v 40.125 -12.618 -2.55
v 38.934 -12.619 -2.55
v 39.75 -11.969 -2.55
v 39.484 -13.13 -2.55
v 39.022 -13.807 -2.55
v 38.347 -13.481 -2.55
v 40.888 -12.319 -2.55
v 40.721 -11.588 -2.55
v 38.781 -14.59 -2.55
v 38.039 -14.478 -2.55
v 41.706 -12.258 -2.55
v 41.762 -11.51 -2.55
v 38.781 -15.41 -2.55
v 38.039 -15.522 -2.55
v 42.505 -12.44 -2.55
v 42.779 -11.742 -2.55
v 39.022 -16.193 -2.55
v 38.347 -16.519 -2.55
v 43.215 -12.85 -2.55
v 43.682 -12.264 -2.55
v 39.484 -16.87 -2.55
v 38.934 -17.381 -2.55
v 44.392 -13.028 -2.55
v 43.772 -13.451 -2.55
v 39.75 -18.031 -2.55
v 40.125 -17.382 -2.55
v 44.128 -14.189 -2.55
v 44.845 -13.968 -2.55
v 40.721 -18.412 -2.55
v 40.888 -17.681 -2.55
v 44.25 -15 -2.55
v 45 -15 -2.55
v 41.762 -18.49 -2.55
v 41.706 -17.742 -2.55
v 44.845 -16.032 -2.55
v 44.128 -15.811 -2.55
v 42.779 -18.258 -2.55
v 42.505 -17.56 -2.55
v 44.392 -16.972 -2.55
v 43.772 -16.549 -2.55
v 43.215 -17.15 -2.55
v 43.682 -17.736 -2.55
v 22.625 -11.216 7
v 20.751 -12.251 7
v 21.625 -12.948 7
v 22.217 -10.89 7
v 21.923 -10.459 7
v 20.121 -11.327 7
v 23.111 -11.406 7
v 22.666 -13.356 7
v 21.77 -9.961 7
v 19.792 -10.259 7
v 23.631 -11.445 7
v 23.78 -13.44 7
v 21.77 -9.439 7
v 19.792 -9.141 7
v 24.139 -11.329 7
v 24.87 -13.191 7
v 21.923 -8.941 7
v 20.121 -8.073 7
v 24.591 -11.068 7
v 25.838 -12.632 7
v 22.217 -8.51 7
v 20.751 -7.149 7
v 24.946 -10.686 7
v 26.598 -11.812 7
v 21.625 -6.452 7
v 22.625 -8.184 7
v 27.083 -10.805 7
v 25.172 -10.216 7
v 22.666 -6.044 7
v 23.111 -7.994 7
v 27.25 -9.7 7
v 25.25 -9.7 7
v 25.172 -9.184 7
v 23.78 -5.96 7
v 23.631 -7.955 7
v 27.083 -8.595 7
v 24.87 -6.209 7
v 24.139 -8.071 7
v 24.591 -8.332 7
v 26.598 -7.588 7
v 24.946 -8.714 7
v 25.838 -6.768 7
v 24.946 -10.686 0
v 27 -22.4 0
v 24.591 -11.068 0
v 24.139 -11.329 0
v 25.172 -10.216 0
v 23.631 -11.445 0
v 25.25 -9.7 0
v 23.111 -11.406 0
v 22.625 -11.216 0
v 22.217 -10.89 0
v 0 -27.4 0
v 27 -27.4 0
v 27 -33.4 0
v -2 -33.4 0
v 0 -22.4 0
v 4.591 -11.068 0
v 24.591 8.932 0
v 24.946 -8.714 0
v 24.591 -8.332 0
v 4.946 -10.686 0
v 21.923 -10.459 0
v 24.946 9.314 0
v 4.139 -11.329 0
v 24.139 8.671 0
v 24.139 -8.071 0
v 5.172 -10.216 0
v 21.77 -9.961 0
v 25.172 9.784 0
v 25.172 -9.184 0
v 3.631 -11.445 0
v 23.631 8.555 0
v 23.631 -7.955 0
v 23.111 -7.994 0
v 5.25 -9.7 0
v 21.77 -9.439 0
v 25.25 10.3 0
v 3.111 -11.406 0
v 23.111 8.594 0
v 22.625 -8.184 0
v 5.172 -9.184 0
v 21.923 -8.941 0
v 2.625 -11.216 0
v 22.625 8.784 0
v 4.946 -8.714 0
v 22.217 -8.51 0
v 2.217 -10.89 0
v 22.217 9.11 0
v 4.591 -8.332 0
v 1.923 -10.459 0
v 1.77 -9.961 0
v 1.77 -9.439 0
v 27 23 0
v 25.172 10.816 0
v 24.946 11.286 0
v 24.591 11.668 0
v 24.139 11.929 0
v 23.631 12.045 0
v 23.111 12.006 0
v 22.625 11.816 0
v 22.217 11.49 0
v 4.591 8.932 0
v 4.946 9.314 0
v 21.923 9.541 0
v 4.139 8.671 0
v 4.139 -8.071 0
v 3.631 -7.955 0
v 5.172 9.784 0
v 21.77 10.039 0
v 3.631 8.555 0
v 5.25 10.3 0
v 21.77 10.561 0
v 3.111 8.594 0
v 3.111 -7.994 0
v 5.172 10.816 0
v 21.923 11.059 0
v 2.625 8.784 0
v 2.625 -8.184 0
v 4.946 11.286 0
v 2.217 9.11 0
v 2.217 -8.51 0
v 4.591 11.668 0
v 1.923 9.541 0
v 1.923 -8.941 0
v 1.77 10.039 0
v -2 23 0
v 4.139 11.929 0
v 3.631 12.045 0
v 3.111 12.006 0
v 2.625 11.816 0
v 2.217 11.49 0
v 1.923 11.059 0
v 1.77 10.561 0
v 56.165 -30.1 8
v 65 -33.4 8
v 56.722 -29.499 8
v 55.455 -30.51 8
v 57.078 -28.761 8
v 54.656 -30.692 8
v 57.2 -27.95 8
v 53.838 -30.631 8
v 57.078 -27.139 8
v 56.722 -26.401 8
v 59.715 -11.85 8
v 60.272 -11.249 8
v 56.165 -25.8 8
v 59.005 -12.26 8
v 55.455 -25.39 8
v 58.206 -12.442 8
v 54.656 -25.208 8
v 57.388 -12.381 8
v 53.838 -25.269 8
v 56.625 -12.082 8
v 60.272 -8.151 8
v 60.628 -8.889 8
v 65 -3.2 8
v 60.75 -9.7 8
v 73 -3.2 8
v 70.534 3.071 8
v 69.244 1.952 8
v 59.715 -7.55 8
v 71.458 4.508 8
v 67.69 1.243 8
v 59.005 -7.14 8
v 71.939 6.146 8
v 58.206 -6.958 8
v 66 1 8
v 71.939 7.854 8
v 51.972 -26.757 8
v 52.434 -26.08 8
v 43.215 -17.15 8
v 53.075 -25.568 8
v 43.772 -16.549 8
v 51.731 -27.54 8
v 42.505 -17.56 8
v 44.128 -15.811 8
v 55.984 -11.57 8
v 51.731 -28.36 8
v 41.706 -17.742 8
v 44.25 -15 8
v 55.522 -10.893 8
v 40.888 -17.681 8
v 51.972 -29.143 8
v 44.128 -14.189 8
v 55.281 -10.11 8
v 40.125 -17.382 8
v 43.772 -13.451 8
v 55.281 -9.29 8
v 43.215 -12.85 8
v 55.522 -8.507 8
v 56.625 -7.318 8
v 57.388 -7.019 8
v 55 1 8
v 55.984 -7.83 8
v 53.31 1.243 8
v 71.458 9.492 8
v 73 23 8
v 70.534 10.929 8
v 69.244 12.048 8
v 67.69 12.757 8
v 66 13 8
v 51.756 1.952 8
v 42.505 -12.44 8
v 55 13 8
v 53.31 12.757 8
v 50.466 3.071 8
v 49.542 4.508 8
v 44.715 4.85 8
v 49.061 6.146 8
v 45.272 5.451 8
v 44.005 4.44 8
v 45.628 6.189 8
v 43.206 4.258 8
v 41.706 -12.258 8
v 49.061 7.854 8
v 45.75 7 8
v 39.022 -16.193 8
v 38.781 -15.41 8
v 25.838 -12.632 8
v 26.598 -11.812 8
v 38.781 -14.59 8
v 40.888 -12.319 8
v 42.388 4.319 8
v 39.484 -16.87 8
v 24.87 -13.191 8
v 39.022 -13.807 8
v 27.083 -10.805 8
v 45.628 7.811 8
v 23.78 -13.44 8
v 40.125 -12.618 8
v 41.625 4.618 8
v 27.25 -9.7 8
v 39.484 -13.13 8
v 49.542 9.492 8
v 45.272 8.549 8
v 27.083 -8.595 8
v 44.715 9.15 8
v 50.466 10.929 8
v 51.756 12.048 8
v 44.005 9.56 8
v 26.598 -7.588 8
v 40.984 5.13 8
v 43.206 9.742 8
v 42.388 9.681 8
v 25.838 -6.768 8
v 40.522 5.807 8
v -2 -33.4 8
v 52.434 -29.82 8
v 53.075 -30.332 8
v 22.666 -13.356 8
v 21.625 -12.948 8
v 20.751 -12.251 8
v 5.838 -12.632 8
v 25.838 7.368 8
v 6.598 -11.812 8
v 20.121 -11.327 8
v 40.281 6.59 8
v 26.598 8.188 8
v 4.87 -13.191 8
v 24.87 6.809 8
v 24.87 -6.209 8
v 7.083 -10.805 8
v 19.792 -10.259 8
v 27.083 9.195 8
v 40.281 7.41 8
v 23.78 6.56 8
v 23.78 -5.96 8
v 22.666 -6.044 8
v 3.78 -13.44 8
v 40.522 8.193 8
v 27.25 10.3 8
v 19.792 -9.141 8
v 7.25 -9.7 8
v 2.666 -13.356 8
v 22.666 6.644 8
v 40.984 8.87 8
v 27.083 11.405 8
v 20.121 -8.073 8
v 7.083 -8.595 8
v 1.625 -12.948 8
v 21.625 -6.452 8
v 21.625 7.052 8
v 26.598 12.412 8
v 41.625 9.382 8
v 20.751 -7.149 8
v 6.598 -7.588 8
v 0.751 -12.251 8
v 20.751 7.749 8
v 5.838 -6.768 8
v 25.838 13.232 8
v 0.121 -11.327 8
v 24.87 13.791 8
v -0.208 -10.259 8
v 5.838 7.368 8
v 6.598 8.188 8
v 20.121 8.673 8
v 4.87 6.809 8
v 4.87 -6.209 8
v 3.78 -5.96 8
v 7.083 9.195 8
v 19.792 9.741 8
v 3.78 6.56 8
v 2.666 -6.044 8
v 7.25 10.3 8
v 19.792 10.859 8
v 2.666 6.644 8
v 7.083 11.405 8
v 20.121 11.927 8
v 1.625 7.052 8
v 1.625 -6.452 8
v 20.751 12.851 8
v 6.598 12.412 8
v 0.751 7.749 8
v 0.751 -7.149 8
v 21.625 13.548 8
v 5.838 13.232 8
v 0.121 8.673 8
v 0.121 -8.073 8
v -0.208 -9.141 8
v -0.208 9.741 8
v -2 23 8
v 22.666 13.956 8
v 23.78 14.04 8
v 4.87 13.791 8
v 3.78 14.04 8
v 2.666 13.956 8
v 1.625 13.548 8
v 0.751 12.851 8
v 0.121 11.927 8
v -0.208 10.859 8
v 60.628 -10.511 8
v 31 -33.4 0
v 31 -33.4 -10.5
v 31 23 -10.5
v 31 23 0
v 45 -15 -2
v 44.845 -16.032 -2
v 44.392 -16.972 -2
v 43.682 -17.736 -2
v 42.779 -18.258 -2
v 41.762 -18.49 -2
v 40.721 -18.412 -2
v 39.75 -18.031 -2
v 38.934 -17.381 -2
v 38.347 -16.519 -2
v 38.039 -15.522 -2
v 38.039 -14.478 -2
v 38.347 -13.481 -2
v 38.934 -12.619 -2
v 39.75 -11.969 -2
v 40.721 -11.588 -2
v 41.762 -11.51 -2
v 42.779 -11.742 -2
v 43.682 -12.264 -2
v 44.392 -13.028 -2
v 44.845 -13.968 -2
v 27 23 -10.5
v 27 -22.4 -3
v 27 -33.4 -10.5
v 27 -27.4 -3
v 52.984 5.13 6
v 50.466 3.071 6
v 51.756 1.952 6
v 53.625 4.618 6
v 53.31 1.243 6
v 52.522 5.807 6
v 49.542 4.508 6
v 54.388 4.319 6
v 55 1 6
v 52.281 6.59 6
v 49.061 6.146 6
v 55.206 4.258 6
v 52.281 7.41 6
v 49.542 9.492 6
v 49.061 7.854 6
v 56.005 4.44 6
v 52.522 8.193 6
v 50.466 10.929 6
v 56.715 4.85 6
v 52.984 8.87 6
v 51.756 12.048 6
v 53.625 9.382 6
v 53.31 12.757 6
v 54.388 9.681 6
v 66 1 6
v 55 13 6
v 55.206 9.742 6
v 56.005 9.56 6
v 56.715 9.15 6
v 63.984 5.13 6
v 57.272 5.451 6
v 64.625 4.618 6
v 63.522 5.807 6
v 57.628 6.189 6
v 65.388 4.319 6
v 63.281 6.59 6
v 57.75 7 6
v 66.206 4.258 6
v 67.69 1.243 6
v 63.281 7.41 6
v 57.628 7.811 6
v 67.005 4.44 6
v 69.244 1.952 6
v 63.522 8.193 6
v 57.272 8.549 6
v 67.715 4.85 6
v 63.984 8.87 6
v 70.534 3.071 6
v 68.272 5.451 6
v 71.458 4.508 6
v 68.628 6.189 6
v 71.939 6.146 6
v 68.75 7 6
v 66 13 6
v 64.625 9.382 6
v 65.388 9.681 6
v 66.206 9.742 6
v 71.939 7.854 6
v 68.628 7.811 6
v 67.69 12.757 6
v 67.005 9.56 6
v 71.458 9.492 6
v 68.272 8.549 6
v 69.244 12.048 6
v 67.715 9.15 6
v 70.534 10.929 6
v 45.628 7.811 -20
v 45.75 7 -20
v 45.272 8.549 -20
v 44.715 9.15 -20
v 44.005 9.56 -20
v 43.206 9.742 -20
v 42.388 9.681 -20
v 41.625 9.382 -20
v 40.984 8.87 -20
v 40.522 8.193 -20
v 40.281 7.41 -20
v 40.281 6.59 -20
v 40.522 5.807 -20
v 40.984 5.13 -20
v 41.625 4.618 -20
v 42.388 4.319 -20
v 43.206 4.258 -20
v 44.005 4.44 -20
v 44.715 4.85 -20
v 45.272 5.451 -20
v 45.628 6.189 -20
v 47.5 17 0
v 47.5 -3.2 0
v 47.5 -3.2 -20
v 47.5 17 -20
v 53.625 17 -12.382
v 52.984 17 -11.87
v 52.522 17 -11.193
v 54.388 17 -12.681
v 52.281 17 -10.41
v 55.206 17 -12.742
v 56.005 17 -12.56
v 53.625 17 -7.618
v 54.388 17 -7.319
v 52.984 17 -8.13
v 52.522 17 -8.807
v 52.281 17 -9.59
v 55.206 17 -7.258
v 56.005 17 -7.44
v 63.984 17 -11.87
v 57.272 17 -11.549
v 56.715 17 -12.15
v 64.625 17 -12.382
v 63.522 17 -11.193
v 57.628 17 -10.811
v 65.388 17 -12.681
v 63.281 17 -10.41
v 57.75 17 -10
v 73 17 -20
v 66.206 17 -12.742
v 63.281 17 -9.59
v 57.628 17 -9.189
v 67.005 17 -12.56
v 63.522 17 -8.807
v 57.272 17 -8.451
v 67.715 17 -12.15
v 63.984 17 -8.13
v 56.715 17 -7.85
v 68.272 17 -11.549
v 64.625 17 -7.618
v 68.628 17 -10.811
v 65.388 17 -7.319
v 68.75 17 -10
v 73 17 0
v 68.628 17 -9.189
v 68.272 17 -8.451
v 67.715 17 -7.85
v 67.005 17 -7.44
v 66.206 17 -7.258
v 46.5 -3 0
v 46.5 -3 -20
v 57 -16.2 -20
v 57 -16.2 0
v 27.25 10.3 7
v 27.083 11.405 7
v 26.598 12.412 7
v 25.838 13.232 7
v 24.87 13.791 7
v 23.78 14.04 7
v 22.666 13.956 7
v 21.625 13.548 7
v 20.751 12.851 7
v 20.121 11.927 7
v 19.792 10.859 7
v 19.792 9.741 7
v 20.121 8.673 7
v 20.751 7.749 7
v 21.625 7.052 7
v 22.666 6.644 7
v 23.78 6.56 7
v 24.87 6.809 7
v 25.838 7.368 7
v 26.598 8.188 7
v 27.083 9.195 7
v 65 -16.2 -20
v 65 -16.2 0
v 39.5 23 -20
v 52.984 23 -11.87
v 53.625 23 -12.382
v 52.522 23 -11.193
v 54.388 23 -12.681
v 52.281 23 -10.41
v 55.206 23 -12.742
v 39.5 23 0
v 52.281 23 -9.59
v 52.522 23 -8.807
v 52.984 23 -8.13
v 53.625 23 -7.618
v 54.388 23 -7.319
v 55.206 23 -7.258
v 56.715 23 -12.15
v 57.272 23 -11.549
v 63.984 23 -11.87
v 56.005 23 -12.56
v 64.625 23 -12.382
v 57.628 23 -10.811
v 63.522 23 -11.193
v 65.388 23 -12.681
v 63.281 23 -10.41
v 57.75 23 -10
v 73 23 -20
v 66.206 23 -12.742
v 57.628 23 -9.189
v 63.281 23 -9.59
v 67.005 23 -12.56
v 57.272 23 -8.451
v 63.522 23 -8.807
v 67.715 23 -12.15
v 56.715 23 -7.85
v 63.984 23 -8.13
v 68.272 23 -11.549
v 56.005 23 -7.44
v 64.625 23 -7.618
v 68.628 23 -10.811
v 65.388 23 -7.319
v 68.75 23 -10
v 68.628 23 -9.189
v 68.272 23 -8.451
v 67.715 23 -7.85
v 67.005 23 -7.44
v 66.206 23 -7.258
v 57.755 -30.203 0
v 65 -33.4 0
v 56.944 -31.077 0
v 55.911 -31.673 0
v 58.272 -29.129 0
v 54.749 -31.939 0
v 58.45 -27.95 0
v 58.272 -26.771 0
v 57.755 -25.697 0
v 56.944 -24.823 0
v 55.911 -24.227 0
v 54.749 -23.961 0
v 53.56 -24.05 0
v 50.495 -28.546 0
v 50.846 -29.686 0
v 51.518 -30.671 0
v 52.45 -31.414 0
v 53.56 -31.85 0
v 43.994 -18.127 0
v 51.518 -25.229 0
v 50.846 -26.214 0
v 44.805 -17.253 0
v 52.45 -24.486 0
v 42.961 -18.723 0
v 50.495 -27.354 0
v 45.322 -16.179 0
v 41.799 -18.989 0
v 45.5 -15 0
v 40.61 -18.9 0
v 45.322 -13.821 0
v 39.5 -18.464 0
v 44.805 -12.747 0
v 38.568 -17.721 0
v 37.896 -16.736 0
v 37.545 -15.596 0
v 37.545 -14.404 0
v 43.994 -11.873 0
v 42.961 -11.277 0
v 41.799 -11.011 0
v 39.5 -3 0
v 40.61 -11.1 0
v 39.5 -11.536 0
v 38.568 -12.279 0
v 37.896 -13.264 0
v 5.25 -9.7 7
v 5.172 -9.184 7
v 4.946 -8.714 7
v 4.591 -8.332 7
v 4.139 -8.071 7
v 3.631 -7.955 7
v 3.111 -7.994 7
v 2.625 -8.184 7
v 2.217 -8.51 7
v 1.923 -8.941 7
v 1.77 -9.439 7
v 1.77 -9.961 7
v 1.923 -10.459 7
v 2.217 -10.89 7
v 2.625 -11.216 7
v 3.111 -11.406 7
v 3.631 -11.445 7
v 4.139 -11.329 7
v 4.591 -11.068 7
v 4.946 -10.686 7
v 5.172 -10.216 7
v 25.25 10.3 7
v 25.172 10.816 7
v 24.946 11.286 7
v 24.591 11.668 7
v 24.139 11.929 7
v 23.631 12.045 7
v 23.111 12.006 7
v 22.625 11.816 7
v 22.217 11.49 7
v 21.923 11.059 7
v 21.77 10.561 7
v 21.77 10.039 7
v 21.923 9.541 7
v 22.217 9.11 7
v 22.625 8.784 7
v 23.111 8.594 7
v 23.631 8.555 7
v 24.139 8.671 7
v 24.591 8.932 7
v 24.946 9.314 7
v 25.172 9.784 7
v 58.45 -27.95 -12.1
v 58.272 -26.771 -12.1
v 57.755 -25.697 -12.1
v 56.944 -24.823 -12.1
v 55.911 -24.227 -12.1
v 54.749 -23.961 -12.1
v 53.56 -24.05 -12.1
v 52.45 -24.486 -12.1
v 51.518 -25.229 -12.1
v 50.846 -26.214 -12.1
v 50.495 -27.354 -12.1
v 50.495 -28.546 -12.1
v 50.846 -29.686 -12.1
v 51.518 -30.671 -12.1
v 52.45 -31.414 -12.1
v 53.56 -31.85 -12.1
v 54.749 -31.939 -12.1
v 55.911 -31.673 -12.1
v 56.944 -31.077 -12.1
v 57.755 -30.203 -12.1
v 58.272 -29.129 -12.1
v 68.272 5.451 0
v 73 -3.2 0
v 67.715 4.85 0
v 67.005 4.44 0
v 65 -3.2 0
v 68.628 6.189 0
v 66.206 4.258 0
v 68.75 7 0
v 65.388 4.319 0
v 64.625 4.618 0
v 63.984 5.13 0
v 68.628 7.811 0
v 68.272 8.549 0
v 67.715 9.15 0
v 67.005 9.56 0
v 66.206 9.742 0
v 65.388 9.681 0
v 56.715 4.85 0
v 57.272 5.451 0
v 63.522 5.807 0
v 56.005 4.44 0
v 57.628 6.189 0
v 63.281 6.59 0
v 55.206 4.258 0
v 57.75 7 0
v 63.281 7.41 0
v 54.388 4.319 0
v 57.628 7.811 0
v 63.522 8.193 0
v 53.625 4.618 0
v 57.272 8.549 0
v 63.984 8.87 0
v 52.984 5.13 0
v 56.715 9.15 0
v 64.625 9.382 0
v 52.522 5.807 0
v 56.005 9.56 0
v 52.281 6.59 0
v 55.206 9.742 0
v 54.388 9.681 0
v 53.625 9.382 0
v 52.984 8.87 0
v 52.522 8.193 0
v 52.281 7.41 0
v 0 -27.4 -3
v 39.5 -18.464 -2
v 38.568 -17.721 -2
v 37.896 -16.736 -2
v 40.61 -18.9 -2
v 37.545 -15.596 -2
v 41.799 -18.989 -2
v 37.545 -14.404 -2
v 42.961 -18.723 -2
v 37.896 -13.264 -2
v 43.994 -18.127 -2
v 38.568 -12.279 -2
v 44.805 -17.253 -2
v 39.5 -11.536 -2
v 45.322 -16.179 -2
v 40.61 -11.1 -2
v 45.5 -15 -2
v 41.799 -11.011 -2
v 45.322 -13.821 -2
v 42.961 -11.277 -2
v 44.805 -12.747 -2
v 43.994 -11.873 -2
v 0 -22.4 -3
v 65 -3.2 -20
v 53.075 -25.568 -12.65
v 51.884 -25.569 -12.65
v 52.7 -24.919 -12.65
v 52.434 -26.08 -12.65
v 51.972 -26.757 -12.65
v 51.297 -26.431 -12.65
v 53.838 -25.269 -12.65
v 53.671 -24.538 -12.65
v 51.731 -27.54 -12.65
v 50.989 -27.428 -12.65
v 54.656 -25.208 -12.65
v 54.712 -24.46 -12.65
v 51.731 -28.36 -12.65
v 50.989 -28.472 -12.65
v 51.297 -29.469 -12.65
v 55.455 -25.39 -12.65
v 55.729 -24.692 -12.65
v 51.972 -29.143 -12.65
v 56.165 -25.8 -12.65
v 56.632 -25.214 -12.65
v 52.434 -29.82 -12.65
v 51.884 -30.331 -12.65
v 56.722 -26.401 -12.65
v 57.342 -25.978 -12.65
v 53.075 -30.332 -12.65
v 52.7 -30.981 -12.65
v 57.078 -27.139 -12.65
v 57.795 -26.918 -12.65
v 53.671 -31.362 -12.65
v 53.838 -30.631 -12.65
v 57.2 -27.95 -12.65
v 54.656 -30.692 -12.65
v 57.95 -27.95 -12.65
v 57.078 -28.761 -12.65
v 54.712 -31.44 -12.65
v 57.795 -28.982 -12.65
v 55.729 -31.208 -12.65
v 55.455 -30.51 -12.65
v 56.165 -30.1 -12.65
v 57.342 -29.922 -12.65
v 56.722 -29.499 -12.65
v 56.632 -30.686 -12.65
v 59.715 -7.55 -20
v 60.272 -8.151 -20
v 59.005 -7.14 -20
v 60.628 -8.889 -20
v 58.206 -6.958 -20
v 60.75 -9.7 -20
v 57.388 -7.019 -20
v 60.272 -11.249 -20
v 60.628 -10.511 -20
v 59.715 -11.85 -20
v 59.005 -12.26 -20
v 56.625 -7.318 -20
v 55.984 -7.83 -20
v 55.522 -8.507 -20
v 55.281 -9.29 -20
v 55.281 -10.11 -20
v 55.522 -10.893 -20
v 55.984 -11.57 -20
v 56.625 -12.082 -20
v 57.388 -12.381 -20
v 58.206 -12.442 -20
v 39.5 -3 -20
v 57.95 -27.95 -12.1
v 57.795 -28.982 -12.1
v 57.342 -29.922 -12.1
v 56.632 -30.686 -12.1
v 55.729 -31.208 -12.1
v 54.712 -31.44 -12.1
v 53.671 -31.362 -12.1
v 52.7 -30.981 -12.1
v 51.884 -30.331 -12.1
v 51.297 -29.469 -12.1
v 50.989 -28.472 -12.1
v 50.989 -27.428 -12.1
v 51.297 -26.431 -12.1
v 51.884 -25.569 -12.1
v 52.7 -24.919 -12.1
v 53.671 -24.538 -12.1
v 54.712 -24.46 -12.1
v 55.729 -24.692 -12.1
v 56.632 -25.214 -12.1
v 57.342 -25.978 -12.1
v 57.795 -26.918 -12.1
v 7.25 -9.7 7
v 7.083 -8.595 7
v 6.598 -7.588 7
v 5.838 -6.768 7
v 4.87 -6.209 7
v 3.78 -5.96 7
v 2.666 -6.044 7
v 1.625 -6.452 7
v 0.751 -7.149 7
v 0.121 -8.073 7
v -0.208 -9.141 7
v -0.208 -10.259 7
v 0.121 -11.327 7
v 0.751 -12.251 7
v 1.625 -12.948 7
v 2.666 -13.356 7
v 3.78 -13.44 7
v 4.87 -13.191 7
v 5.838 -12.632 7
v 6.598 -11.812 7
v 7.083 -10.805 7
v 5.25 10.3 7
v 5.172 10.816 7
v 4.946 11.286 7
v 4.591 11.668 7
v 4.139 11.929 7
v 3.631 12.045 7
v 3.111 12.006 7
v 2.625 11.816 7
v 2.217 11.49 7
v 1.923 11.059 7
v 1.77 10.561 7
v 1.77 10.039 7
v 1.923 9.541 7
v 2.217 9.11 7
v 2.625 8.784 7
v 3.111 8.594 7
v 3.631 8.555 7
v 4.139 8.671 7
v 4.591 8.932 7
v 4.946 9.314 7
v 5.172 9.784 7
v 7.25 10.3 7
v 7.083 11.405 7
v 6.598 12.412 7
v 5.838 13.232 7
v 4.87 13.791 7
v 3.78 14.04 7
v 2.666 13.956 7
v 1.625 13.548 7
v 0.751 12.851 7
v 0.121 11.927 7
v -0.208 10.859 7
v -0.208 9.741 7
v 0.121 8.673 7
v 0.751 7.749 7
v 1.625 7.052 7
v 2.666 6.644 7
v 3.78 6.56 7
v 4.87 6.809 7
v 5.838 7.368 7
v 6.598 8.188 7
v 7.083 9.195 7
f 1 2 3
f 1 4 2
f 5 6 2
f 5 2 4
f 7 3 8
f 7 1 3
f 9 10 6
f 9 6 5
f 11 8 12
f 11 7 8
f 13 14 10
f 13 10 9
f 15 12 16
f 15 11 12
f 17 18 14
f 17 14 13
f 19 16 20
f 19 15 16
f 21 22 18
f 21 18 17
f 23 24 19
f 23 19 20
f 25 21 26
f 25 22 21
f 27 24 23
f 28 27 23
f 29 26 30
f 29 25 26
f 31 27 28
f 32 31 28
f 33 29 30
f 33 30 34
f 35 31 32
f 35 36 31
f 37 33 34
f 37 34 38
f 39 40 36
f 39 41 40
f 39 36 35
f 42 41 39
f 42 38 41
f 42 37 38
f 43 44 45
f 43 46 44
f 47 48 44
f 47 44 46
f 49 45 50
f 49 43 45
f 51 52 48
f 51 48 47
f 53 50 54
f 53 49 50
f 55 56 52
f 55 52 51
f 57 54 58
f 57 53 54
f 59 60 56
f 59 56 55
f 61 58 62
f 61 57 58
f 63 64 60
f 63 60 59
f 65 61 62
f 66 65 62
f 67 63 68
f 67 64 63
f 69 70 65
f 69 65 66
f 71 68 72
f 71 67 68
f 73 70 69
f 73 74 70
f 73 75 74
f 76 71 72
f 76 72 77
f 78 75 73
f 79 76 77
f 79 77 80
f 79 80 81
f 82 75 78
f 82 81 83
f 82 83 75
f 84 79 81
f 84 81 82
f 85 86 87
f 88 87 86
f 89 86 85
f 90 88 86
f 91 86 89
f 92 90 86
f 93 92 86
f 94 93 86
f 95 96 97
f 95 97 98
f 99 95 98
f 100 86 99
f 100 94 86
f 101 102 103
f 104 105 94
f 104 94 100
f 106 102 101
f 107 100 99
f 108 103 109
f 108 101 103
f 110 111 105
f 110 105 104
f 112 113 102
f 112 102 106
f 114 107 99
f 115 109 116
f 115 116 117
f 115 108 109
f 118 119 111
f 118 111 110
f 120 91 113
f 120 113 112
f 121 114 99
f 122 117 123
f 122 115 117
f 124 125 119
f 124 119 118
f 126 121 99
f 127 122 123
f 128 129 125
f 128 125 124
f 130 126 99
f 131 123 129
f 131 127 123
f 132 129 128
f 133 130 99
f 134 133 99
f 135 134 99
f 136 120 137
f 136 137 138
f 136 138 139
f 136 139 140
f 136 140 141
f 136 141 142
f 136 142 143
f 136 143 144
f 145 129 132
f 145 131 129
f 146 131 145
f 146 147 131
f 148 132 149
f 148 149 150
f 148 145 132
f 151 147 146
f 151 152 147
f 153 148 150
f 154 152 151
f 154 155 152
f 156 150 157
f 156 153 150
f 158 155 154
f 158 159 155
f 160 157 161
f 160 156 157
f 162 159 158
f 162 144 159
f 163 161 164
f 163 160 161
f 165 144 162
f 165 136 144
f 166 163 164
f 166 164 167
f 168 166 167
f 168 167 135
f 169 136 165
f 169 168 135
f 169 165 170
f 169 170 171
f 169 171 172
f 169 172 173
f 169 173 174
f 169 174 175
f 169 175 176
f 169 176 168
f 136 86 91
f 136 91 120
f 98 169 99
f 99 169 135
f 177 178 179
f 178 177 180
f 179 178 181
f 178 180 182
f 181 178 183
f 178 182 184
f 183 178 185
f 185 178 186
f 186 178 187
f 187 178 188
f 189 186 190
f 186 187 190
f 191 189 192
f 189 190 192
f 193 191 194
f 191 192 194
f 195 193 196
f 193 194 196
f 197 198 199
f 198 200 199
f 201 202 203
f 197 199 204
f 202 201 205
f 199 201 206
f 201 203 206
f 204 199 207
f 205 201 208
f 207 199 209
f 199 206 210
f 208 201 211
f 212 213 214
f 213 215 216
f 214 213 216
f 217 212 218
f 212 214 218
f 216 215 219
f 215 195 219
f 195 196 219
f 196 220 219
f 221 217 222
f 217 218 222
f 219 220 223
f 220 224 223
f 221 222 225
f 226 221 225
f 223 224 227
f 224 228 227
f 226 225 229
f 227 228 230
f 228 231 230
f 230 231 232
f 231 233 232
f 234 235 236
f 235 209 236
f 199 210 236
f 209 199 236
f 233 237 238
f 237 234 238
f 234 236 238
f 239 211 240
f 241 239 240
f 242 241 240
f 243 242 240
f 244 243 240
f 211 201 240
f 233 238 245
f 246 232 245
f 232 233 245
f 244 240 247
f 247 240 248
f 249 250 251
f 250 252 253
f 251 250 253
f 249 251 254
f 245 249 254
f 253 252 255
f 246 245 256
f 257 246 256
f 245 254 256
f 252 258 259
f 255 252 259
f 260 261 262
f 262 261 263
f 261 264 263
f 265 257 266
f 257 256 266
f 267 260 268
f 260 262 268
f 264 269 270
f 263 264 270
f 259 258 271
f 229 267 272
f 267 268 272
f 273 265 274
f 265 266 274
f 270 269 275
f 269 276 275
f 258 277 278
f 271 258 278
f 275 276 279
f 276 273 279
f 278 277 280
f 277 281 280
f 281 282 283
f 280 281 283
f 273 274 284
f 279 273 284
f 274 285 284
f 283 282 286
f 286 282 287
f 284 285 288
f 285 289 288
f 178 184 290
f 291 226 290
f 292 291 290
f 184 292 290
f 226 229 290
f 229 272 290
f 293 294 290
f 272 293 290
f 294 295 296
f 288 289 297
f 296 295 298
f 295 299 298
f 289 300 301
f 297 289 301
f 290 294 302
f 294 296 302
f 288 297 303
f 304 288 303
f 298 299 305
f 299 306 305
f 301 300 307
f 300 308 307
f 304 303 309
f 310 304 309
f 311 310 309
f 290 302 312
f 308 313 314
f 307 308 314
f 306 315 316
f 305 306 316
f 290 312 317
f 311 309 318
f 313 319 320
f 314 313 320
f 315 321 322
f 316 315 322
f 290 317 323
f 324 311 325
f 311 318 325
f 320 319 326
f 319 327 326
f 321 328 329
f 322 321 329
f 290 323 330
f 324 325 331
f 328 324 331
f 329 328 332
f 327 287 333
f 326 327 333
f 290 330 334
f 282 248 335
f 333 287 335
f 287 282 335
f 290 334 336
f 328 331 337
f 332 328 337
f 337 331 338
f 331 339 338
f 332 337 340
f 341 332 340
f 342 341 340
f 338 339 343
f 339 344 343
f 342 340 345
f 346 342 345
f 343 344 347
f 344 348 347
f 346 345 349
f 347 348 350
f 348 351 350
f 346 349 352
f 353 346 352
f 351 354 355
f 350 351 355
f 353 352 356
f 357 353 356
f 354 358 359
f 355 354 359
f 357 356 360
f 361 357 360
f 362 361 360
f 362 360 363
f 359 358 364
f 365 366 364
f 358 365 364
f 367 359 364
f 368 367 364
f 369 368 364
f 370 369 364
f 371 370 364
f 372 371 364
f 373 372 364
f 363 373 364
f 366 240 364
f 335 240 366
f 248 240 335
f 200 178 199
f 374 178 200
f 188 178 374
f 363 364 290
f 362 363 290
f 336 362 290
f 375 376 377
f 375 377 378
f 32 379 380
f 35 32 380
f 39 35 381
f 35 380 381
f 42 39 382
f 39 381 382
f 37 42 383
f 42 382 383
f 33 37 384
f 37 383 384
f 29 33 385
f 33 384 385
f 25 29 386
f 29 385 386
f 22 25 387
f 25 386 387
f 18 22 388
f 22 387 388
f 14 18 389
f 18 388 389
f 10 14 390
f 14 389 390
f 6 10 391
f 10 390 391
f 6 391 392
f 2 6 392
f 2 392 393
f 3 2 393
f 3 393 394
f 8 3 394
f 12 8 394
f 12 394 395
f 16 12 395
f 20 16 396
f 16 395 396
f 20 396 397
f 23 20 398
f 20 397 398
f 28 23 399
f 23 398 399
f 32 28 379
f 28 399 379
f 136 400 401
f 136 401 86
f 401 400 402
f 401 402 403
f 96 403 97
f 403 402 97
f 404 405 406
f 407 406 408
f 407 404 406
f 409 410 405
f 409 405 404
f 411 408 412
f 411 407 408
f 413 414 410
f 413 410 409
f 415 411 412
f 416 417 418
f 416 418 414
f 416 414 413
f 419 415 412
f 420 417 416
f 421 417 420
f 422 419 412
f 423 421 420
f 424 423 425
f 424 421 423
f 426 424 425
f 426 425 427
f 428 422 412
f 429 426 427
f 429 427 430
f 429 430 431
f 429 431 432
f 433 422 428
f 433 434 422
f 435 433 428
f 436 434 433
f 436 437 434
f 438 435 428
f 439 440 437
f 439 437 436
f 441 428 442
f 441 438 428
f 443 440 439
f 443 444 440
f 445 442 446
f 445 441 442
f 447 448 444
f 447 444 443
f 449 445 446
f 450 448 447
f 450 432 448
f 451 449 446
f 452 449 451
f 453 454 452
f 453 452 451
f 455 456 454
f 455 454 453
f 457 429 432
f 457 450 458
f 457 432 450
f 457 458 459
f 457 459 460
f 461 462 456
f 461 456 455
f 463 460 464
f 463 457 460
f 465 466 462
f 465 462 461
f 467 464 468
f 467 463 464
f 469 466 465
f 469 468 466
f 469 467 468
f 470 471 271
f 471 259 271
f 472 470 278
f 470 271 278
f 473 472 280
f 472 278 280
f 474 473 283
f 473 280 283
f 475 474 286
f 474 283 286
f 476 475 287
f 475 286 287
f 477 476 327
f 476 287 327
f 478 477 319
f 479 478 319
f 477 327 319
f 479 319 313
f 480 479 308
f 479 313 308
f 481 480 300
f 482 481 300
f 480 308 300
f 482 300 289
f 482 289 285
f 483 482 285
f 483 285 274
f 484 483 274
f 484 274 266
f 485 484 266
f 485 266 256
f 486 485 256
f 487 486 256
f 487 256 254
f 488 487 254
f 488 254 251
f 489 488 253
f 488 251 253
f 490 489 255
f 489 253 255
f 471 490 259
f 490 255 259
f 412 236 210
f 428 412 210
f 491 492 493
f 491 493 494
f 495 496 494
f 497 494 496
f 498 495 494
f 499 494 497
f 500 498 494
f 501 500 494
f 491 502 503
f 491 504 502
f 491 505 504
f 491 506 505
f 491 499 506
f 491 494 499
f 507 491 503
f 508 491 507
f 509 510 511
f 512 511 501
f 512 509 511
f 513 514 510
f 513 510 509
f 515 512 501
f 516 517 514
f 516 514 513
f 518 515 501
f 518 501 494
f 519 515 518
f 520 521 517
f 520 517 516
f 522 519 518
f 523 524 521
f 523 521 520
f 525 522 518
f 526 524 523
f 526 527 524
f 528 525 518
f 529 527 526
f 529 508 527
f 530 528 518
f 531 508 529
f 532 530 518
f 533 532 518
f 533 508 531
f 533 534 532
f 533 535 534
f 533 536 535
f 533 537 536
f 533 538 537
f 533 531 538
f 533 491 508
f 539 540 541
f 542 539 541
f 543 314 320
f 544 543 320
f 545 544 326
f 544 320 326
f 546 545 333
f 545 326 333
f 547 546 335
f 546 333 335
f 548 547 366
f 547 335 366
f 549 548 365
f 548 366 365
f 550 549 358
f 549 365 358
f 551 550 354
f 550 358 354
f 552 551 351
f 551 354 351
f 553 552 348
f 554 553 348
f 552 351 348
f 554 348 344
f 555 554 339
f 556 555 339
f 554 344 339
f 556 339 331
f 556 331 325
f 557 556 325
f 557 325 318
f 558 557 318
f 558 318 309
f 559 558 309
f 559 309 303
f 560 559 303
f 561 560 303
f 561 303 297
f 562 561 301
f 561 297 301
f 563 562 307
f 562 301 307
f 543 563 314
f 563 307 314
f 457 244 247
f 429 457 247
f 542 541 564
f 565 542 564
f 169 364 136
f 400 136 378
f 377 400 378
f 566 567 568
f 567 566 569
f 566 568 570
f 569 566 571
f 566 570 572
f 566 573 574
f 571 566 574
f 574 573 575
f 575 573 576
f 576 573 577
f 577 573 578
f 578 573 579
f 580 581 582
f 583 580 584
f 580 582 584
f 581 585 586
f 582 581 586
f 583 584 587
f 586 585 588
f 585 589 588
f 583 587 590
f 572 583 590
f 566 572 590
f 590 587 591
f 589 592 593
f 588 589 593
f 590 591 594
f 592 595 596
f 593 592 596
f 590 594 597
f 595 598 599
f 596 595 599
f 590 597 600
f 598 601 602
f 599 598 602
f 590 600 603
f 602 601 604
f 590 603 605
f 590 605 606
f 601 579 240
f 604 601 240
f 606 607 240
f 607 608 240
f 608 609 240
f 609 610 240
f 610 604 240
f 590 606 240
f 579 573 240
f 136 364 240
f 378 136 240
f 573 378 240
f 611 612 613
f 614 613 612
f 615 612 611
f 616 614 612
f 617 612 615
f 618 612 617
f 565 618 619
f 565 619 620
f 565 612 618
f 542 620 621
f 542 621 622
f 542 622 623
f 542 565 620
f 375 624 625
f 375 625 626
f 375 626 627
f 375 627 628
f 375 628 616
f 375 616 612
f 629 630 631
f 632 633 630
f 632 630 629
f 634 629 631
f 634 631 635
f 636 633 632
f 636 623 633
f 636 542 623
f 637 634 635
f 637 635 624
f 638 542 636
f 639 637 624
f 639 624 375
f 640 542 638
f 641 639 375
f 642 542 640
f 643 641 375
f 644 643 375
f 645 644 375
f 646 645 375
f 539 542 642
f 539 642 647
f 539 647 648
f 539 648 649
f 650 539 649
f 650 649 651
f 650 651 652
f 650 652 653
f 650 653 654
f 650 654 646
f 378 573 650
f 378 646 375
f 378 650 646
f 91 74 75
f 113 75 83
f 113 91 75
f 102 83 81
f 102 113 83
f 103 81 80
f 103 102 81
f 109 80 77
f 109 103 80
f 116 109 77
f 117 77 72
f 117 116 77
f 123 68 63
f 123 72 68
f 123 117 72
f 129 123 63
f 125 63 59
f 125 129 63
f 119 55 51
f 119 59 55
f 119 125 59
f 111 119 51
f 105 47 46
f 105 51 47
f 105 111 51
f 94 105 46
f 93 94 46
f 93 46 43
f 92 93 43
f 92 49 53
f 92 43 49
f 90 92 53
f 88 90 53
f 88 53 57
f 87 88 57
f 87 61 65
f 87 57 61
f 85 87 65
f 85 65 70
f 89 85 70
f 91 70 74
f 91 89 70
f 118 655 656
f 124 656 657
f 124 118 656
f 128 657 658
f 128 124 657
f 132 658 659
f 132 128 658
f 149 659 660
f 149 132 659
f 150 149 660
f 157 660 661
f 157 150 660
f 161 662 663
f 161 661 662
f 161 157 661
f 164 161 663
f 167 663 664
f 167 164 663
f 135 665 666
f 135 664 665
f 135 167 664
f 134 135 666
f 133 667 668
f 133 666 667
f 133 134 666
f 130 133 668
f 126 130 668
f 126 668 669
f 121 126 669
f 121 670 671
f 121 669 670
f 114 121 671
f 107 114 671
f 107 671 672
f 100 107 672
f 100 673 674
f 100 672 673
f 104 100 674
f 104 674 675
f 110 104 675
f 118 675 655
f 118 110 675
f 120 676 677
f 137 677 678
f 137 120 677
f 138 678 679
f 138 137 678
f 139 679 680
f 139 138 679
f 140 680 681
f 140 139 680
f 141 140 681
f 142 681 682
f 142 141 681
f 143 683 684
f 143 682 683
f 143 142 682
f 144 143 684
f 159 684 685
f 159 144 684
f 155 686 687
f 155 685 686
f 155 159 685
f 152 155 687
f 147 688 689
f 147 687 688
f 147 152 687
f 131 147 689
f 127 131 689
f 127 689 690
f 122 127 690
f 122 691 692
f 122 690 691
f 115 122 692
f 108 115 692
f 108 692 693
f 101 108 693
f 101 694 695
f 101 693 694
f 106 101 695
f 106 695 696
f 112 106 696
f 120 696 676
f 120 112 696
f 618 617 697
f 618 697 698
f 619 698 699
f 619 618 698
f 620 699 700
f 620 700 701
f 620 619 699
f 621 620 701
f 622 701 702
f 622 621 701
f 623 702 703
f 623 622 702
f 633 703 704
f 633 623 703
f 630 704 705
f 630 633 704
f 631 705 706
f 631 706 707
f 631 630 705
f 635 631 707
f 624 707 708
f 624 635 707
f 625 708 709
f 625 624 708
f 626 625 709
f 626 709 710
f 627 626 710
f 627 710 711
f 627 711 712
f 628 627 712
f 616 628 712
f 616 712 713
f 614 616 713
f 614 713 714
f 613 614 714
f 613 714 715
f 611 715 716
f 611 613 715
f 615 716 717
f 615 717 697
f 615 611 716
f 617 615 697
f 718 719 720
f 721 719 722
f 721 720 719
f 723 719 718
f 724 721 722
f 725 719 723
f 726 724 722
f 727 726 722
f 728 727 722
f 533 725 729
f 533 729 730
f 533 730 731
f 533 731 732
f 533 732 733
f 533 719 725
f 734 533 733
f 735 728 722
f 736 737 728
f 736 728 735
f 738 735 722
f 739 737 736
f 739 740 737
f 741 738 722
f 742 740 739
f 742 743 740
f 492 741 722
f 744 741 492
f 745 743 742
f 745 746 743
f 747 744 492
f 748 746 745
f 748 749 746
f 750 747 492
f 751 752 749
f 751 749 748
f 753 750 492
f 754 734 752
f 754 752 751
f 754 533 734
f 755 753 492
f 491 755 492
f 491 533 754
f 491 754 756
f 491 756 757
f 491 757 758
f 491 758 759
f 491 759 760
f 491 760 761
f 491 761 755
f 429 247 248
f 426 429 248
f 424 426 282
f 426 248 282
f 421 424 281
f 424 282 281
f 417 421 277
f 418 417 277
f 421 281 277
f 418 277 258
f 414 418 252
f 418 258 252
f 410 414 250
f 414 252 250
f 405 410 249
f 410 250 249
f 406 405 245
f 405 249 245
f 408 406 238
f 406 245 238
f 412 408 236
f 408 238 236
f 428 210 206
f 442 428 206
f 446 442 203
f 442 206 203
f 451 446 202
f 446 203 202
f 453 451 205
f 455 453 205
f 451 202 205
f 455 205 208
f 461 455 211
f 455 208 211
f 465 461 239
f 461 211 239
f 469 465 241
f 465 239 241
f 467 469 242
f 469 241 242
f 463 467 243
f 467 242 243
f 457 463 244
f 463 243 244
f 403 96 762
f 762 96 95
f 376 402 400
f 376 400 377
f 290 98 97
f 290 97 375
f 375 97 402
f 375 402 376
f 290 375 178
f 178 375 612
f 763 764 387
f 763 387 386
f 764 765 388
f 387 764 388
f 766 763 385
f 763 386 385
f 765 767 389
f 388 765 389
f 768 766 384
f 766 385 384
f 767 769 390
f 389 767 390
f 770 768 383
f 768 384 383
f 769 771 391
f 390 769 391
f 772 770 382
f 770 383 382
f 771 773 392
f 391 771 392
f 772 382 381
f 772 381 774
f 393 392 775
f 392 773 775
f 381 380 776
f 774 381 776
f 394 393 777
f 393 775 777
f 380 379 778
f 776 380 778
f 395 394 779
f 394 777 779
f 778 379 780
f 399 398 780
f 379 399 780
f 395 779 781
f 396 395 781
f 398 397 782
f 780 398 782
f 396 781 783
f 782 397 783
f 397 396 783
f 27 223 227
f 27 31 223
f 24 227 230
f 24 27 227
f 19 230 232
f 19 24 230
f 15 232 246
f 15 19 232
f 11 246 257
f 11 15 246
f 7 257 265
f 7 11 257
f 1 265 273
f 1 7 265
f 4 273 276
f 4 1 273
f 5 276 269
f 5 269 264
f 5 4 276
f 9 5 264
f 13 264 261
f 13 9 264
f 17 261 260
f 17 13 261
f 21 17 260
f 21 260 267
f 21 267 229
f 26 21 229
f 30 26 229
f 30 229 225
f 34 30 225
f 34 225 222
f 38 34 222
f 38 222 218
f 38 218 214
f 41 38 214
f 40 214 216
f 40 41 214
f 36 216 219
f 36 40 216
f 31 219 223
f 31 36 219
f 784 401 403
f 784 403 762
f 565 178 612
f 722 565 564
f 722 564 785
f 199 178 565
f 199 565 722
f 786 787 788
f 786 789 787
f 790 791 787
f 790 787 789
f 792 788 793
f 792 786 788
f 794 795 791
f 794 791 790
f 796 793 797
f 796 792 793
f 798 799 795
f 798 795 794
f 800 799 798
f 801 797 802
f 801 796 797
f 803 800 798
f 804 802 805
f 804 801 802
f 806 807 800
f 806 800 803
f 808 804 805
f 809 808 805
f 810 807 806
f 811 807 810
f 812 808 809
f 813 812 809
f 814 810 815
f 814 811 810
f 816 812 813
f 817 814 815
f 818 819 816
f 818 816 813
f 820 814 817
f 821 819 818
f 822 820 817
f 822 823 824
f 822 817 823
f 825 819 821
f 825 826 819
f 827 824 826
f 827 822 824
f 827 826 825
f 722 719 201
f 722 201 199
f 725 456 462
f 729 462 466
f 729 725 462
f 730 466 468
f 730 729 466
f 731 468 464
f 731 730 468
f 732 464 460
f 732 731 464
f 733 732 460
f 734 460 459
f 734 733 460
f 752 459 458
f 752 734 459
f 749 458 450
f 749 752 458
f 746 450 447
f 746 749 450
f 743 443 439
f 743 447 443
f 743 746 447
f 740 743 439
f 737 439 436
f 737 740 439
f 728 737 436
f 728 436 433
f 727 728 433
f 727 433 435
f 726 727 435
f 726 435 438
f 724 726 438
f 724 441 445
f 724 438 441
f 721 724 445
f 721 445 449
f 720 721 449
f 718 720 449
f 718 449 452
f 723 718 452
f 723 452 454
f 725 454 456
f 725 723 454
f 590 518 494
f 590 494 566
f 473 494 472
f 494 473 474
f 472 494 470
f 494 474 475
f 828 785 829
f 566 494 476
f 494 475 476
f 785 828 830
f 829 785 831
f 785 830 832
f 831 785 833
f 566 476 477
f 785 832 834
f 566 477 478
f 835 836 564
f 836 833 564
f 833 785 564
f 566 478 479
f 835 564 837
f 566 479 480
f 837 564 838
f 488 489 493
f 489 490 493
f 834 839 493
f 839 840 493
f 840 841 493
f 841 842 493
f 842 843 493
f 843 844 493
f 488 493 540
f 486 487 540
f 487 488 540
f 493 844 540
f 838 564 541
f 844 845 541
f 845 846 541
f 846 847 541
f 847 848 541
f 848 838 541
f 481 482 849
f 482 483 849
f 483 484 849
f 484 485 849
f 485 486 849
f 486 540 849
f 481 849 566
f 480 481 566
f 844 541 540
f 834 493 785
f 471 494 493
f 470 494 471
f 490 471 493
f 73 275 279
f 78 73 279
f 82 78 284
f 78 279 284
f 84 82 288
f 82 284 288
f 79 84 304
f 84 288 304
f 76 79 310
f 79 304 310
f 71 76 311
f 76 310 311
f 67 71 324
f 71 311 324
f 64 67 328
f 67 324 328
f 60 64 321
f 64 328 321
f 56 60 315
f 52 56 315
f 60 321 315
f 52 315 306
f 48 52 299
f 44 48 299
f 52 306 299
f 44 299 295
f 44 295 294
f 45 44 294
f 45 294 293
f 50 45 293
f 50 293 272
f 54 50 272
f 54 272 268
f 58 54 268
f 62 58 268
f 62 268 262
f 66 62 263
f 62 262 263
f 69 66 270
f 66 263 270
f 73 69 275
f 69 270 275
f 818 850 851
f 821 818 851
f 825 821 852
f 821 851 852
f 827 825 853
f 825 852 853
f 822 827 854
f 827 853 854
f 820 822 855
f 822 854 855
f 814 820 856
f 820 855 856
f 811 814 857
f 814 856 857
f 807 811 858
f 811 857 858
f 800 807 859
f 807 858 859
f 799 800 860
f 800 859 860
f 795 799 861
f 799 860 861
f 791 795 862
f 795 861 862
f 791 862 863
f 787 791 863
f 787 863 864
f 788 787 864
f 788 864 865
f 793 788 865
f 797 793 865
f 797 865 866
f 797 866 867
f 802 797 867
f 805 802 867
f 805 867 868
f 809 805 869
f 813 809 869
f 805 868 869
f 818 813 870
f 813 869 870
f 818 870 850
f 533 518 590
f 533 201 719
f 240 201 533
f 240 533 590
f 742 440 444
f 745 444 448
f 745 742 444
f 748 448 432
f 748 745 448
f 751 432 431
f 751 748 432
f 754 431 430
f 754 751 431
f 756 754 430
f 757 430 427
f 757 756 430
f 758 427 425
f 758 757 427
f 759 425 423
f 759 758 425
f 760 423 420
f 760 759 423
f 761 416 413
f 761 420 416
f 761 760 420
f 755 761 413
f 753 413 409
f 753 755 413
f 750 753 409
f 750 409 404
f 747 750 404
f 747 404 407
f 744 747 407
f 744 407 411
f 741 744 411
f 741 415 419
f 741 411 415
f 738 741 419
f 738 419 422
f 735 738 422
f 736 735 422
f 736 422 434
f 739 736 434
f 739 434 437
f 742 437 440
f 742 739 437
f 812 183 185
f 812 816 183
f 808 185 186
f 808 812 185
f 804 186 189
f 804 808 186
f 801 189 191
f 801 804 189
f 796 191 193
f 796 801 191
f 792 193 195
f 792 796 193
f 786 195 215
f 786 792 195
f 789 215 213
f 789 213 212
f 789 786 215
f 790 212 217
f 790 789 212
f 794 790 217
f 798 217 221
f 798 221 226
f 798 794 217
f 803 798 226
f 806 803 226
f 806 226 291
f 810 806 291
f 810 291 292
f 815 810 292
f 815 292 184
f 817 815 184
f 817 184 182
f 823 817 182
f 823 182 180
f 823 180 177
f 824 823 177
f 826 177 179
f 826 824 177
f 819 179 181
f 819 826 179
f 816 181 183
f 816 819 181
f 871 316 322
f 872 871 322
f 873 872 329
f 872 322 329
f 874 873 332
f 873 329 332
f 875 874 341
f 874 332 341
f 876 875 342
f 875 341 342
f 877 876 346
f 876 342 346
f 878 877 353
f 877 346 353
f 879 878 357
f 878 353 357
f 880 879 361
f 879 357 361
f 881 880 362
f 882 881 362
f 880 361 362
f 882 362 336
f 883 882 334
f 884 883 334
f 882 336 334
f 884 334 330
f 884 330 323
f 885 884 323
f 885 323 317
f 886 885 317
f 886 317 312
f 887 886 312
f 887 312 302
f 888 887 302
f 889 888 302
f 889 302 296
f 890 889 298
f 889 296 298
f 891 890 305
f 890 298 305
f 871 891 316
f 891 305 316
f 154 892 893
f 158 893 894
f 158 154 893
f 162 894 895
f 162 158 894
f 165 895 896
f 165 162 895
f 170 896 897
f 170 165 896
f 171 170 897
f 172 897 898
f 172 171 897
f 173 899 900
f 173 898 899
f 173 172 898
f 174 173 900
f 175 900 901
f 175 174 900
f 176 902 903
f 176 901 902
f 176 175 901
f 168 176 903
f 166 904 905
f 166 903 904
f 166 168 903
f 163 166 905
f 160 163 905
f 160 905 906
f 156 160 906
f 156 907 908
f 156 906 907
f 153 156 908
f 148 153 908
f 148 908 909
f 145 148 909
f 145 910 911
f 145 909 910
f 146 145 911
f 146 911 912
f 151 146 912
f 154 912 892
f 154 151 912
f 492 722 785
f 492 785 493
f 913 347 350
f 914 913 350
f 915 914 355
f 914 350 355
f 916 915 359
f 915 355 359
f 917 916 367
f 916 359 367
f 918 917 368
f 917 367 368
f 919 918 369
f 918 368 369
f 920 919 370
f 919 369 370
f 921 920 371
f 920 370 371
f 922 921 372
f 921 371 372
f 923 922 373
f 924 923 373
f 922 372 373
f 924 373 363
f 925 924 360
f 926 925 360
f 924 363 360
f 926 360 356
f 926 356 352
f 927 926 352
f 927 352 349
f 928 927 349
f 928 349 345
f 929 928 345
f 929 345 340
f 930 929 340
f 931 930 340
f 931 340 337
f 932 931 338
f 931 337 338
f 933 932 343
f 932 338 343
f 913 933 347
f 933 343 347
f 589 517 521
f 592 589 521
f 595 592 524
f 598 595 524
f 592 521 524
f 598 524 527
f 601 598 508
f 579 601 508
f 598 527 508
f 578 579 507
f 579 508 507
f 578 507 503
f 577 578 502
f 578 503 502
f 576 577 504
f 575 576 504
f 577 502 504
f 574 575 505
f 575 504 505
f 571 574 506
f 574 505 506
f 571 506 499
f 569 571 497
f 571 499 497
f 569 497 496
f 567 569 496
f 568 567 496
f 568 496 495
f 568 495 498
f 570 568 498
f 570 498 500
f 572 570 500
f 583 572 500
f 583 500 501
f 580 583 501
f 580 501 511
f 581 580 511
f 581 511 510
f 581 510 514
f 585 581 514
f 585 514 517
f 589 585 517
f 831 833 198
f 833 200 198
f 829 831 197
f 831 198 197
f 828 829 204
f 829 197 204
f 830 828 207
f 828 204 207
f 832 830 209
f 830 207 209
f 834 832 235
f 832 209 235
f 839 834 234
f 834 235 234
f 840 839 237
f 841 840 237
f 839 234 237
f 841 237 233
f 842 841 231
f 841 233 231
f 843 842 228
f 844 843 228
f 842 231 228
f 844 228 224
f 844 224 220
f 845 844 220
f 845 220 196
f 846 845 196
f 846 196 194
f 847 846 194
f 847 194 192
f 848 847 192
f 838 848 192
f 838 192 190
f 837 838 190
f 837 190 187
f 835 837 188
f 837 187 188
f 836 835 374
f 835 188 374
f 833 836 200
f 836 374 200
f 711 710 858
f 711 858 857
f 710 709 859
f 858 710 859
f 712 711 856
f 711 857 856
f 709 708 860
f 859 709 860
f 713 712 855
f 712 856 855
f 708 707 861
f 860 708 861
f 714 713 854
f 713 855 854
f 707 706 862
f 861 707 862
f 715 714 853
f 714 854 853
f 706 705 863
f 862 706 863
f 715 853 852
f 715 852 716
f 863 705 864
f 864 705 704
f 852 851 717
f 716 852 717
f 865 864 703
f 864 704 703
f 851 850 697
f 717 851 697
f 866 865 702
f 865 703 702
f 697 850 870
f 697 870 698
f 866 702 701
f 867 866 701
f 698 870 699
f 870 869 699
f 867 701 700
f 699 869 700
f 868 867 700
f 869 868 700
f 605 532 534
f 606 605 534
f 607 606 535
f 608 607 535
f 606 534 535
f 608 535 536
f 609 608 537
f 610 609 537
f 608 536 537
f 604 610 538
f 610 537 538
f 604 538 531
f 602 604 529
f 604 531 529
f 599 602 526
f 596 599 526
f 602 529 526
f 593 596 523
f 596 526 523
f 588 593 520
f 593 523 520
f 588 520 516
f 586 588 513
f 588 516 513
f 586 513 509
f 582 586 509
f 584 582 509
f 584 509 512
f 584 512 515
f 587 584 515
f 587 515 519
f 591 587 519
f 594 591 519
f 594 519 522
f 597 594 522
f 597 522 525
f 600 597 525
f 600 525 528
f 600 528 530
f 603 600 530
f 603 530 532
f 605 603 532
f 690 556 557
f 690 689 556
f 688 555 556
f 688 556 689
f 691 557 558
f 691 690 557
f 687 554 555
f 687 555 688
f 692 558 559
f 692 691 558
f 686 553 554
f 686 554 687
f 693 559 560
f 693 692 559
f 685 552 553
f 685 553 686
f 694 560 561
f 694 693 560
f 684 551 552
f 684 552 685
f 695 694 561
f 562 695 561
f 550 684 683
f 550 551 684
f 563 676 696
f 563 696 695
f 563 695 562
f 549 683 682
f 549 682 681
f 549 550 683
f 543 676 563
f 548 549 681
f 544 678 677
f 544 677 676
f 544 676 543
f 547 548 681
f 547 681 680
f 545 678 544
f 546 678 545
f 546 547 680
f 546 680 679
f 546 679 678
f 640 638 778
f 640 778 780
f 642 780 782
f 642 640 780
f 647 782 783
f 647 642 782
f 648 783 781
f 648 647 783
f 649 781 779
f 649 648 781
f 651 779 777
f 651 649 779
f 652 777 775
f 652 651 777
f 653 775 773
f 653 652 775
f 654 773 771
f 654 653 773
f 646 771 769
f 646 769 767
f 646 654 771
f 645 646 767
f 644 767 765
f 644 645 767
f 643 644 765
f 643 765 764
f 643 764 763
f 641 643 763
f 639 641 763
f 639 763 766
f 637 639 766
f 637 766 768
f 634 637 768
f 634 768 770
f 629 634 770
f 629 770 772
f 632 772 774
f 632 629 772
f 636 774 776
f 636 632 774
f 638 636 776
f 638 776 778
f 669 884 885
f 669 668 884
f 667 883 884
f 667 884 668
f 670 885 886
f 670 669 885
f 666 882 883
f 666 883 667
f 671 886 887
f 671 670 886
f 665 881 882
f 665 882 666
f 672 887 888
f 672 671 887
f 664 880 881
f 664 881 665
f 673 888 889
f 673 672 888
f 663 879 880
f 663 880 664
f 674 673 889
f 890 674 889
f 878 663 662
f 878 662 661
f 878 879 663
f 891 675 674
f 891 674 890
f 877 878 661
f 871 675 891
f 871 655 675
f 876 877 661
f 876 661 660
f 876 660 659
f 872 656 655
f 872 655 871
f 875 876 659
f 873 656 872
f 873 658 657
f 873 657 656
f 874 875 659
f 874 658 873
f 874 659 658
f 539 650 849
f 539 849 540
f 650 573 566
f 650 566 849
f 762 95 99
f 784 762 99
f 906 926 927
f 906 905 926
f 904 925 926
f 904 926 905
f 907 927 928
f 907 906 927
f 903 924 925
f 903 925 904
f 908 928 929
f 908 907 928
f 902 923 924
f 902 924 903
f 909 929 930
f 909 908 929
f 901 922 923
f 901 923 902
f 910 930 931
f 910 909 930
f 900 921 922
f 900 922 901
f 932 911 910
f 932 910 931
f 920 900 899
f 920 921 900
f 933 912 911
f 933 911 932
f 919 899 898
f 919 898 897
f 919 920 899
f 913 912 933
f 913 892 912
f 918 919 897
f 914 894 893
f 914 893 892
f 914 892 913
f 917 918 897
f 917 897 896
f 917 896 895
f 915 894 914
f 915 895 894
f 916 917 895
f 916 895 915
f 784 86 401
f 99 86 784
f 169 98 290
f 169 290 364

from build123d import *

# Parameters (mm, degrees)
SKETCH_R             = 1.75
SKETCH_R_2           = 2.75
PAD_DEPTH            = 8
PAD001_DEPTH         = 20
SKETCH004_R          = 2.75
POCKET_DEPTH         = 23.001
SKETCH005_R          = 2.75
POCKET001_DEPTH      = 20.001
POCKET001_DEPTH_BACK = 8.001
SKETCH008_R          = 4
SKETCH008_R_2        = 2.75
PAD005_DEPTH         = 2
SKETCH009_R          = 3.5
SKETCH009_R_2        = 2.75
PAD006_DEPTH         = 0.55
SKETCH010_R          = 4
SKETCH010_R_2        = 2.75
PAD007_DEPTH         = 12.1
SKETCH011_R          = 3.5
SKETCH011_R_2        = 2.75
PAD008_DEPTH         = 0.55
POCKET004_DEPTH      = 2
SKETCH020_W          = 4
SKETCH020_H          = 10.5
PAD013_DEPTH         = 33.4
PAD013_DEPTH_BACK    = 23
SKETCH021_W          = 27
SKETCH021_H          = 5
PAD014_DEPTH         = 3
SKETCH023_R          = 3.75
POCKET007_DEPTH      = 1


with BuildPart() as part:
    # Sketch → Pad (new body)
    with BuildSketch(Plane.XY):
        Polygon((0, 23), (73, 23), (73, -3.2), (65, -3.2), (65, -33.4), (0, -33.4), (-2, -33.4), (-2, 23), align=None)
        with Locations((3.5, 10.3)):
            Circle(SKETCH_R, mode=Mode.SUBTRACT)
        with Locations((23.5, 10.3)):
            Circle(SKETCH_R, mode=Mode.SUBTRACT)
        with Locations((3.5, -9.7)):
            Circle(SKETCH_R, mode=Mode.SUBTRACT)
        with Locations((23.5, -9.7)):
            Circle(SKETCH_R, mode=Mode.SUBTRACT)
        with Locations((55, 7)):
            Circle(SKETCH_R_2, mode=Mode.SUBTRACT)
        with Locations((41.5, -15)):
            Circle(SKETCH_R_2, mode=Mode.SUBTRACT)
        with Locations((54.45, -27.95)):
            Circle(SKETCH_R_2, mode=Mode.SUBTRACT)
        with Locations((66, 7)):
            Circle(SKETCH_R_2, mode=Mode.SUBTRACT)
    extrude(amount=PAD_DEPTH)

    # Sketch001 → Pad001 (join)
    with BuildSketch(Plane(origin=(0, 0, 0), x_dir=(1, 0, 0), z_dir=(0, 0, -1))):
        Polygon((73, -23), (39.5, -23), (39.5, 3), (46.5, 3), (57, 16.2), (65, 16.2), (65, 3.2), (47.5, 3.2), (47.5, -17), (73, -17), align=None)
    extrude(amount=PAD001_DEPTH)

    # Sketch004 → Pocket (cut, through all)
    with BuildSketch(Plane.XZ):
        with Locations((55, -10)):
            Circle(SKETCH004_R)
        with Locations((66, -10)):
            Circle(SKETCH004_R)
    extrude(amount=-POCKET_DEPTH, mode=Mode.SUBTRACT)

    # Sketch005 → Pocket001 (cut, two sides)
    with BuildSketch(Plane.XY) as pocket001_sk:
        with Locations((58, -9.7)):
            Circle(SKETCH005_R)
        with Locations((43, 7)):
            Circle(SKETCH005_R)
    extrude(amount=-POCKET001_DEPTH, mode=Mode.SUBTRACT)
    extrude(pocket001_sk.sketch, amount=POCKET001_DEPTH_BACK, mode=Mode.SUBTRACT)

    # Sketch008 → Pad005 (join)
    with BuildSketch(Plane.XY):
        with Locations((41.5, -15)):
            Circle(SKETCH008_R)
        with Locations((41.5, -15)):
            Circle(SKETCH008_R_2, mode=Mode.SUBTRACT)
    extrude(amount=-PAD005_DEPTH)

    # Sketch009 (on Face30 of Pad005) → Pad006 (join)
    with BuildSketch(Plane(origin=(0, 0, -2), x_dir=(1, 0, 0), z_dir=(0, 0, -1))):
        with Locations((41.5, 15)):
            Circle(SKETCH009_R)
        with Locations((41.5, 15)):
            Circle(SKETCH009_R_2, mode=Mode.SUBTRACT)
    extrude(amount=PAD006_DEPTH)

    # Sketch010 → Pad007 (join)
    with BuildSketch(Plane.XY):
        with Locations((54.45, -27.95)):
            Circle(SKETCH010_R)
        with Locations((54.45, -27.95)):
            Circle(SKETCH010_R_2, mode=Mode.SUBTRACT)
    extrude(amount=-PAD007_DEPTH)

    # Sketch011 (on Face32 of Pad007) → Pad008 (join)
    with BuildSketch(Plane(origin=(0, 0, -12.1), x_dir=(1, 0, 0), z_dir=(0, 0, -1))):
        with Locations((54.45, 27.95)):
            Circle(SKETCH011_R)
        with Locations((54.45, 27.95)):
            Circle(SKETCH011_R_2, mode=Mode.SUBTRACT)
    extrude(amount=PAD008_DEPTH)

    # Sketch017 (on DatumPlane) → Pocket004 (cut)
    with BuildSketch(Plane.XY.offset(8)):
        with BuildLine():
            ThreePointArc((55, 13), (49, 7), (55, 1))
            Line((55, 1), (66, 1))
            ThreePointArc((66, 1), (72, 7), (66, 13))
            Line((66, 13), (55, 13))
        make_face()
    extrude(amount=-POCKET004_DEPTH, mode=Mode.SUBTRACT)

    # Sketch020 → Pad013 (join, two sides)
    with BuildSketch(Plane.XZ) as pad013_sk:
        with Locations((29, -5.25)):
            Rectangle(SKETCH020_W, SKETCH020_H)
    extrude(amount=PAD013_DEPTH)
    extrude(pad013_sk.sketch, amount=-PAD013_DEPTH_BACK)

    # Sketch021 → Pad014 (join)
    with BuildSketch(Plane(origin=(0, 0, 0), x_dir=(-1, 0, 0), z_dir=(0, 0, -1))):
        with Locations((-13.5, -24.9)):
            Rectangle(SKETCH021_W, SKETCH021_H)
    extrude(amount=PAD014_DEPTH)

    # Sketch023 (on DatumPlane) → Pocket007 (cut)
    with BuildSketch(Plane.XY.offset(8)):
        with Locations((3.5, 10.3)):
            Circle(SKETCH023_R)
        with Locations((23.5, 10.3)):
            Circle(SKETCH023_R)
        with Locations((3.5, -9.7)):
            Circle(SKETCH023_R)
        with Locations((23.5, -9.7)):
            Circle(SKETCH023_R)
    extrude(amount=-POCKET007_DEPTH, mode=Mode.SUBTRACT)


solid = part.part
